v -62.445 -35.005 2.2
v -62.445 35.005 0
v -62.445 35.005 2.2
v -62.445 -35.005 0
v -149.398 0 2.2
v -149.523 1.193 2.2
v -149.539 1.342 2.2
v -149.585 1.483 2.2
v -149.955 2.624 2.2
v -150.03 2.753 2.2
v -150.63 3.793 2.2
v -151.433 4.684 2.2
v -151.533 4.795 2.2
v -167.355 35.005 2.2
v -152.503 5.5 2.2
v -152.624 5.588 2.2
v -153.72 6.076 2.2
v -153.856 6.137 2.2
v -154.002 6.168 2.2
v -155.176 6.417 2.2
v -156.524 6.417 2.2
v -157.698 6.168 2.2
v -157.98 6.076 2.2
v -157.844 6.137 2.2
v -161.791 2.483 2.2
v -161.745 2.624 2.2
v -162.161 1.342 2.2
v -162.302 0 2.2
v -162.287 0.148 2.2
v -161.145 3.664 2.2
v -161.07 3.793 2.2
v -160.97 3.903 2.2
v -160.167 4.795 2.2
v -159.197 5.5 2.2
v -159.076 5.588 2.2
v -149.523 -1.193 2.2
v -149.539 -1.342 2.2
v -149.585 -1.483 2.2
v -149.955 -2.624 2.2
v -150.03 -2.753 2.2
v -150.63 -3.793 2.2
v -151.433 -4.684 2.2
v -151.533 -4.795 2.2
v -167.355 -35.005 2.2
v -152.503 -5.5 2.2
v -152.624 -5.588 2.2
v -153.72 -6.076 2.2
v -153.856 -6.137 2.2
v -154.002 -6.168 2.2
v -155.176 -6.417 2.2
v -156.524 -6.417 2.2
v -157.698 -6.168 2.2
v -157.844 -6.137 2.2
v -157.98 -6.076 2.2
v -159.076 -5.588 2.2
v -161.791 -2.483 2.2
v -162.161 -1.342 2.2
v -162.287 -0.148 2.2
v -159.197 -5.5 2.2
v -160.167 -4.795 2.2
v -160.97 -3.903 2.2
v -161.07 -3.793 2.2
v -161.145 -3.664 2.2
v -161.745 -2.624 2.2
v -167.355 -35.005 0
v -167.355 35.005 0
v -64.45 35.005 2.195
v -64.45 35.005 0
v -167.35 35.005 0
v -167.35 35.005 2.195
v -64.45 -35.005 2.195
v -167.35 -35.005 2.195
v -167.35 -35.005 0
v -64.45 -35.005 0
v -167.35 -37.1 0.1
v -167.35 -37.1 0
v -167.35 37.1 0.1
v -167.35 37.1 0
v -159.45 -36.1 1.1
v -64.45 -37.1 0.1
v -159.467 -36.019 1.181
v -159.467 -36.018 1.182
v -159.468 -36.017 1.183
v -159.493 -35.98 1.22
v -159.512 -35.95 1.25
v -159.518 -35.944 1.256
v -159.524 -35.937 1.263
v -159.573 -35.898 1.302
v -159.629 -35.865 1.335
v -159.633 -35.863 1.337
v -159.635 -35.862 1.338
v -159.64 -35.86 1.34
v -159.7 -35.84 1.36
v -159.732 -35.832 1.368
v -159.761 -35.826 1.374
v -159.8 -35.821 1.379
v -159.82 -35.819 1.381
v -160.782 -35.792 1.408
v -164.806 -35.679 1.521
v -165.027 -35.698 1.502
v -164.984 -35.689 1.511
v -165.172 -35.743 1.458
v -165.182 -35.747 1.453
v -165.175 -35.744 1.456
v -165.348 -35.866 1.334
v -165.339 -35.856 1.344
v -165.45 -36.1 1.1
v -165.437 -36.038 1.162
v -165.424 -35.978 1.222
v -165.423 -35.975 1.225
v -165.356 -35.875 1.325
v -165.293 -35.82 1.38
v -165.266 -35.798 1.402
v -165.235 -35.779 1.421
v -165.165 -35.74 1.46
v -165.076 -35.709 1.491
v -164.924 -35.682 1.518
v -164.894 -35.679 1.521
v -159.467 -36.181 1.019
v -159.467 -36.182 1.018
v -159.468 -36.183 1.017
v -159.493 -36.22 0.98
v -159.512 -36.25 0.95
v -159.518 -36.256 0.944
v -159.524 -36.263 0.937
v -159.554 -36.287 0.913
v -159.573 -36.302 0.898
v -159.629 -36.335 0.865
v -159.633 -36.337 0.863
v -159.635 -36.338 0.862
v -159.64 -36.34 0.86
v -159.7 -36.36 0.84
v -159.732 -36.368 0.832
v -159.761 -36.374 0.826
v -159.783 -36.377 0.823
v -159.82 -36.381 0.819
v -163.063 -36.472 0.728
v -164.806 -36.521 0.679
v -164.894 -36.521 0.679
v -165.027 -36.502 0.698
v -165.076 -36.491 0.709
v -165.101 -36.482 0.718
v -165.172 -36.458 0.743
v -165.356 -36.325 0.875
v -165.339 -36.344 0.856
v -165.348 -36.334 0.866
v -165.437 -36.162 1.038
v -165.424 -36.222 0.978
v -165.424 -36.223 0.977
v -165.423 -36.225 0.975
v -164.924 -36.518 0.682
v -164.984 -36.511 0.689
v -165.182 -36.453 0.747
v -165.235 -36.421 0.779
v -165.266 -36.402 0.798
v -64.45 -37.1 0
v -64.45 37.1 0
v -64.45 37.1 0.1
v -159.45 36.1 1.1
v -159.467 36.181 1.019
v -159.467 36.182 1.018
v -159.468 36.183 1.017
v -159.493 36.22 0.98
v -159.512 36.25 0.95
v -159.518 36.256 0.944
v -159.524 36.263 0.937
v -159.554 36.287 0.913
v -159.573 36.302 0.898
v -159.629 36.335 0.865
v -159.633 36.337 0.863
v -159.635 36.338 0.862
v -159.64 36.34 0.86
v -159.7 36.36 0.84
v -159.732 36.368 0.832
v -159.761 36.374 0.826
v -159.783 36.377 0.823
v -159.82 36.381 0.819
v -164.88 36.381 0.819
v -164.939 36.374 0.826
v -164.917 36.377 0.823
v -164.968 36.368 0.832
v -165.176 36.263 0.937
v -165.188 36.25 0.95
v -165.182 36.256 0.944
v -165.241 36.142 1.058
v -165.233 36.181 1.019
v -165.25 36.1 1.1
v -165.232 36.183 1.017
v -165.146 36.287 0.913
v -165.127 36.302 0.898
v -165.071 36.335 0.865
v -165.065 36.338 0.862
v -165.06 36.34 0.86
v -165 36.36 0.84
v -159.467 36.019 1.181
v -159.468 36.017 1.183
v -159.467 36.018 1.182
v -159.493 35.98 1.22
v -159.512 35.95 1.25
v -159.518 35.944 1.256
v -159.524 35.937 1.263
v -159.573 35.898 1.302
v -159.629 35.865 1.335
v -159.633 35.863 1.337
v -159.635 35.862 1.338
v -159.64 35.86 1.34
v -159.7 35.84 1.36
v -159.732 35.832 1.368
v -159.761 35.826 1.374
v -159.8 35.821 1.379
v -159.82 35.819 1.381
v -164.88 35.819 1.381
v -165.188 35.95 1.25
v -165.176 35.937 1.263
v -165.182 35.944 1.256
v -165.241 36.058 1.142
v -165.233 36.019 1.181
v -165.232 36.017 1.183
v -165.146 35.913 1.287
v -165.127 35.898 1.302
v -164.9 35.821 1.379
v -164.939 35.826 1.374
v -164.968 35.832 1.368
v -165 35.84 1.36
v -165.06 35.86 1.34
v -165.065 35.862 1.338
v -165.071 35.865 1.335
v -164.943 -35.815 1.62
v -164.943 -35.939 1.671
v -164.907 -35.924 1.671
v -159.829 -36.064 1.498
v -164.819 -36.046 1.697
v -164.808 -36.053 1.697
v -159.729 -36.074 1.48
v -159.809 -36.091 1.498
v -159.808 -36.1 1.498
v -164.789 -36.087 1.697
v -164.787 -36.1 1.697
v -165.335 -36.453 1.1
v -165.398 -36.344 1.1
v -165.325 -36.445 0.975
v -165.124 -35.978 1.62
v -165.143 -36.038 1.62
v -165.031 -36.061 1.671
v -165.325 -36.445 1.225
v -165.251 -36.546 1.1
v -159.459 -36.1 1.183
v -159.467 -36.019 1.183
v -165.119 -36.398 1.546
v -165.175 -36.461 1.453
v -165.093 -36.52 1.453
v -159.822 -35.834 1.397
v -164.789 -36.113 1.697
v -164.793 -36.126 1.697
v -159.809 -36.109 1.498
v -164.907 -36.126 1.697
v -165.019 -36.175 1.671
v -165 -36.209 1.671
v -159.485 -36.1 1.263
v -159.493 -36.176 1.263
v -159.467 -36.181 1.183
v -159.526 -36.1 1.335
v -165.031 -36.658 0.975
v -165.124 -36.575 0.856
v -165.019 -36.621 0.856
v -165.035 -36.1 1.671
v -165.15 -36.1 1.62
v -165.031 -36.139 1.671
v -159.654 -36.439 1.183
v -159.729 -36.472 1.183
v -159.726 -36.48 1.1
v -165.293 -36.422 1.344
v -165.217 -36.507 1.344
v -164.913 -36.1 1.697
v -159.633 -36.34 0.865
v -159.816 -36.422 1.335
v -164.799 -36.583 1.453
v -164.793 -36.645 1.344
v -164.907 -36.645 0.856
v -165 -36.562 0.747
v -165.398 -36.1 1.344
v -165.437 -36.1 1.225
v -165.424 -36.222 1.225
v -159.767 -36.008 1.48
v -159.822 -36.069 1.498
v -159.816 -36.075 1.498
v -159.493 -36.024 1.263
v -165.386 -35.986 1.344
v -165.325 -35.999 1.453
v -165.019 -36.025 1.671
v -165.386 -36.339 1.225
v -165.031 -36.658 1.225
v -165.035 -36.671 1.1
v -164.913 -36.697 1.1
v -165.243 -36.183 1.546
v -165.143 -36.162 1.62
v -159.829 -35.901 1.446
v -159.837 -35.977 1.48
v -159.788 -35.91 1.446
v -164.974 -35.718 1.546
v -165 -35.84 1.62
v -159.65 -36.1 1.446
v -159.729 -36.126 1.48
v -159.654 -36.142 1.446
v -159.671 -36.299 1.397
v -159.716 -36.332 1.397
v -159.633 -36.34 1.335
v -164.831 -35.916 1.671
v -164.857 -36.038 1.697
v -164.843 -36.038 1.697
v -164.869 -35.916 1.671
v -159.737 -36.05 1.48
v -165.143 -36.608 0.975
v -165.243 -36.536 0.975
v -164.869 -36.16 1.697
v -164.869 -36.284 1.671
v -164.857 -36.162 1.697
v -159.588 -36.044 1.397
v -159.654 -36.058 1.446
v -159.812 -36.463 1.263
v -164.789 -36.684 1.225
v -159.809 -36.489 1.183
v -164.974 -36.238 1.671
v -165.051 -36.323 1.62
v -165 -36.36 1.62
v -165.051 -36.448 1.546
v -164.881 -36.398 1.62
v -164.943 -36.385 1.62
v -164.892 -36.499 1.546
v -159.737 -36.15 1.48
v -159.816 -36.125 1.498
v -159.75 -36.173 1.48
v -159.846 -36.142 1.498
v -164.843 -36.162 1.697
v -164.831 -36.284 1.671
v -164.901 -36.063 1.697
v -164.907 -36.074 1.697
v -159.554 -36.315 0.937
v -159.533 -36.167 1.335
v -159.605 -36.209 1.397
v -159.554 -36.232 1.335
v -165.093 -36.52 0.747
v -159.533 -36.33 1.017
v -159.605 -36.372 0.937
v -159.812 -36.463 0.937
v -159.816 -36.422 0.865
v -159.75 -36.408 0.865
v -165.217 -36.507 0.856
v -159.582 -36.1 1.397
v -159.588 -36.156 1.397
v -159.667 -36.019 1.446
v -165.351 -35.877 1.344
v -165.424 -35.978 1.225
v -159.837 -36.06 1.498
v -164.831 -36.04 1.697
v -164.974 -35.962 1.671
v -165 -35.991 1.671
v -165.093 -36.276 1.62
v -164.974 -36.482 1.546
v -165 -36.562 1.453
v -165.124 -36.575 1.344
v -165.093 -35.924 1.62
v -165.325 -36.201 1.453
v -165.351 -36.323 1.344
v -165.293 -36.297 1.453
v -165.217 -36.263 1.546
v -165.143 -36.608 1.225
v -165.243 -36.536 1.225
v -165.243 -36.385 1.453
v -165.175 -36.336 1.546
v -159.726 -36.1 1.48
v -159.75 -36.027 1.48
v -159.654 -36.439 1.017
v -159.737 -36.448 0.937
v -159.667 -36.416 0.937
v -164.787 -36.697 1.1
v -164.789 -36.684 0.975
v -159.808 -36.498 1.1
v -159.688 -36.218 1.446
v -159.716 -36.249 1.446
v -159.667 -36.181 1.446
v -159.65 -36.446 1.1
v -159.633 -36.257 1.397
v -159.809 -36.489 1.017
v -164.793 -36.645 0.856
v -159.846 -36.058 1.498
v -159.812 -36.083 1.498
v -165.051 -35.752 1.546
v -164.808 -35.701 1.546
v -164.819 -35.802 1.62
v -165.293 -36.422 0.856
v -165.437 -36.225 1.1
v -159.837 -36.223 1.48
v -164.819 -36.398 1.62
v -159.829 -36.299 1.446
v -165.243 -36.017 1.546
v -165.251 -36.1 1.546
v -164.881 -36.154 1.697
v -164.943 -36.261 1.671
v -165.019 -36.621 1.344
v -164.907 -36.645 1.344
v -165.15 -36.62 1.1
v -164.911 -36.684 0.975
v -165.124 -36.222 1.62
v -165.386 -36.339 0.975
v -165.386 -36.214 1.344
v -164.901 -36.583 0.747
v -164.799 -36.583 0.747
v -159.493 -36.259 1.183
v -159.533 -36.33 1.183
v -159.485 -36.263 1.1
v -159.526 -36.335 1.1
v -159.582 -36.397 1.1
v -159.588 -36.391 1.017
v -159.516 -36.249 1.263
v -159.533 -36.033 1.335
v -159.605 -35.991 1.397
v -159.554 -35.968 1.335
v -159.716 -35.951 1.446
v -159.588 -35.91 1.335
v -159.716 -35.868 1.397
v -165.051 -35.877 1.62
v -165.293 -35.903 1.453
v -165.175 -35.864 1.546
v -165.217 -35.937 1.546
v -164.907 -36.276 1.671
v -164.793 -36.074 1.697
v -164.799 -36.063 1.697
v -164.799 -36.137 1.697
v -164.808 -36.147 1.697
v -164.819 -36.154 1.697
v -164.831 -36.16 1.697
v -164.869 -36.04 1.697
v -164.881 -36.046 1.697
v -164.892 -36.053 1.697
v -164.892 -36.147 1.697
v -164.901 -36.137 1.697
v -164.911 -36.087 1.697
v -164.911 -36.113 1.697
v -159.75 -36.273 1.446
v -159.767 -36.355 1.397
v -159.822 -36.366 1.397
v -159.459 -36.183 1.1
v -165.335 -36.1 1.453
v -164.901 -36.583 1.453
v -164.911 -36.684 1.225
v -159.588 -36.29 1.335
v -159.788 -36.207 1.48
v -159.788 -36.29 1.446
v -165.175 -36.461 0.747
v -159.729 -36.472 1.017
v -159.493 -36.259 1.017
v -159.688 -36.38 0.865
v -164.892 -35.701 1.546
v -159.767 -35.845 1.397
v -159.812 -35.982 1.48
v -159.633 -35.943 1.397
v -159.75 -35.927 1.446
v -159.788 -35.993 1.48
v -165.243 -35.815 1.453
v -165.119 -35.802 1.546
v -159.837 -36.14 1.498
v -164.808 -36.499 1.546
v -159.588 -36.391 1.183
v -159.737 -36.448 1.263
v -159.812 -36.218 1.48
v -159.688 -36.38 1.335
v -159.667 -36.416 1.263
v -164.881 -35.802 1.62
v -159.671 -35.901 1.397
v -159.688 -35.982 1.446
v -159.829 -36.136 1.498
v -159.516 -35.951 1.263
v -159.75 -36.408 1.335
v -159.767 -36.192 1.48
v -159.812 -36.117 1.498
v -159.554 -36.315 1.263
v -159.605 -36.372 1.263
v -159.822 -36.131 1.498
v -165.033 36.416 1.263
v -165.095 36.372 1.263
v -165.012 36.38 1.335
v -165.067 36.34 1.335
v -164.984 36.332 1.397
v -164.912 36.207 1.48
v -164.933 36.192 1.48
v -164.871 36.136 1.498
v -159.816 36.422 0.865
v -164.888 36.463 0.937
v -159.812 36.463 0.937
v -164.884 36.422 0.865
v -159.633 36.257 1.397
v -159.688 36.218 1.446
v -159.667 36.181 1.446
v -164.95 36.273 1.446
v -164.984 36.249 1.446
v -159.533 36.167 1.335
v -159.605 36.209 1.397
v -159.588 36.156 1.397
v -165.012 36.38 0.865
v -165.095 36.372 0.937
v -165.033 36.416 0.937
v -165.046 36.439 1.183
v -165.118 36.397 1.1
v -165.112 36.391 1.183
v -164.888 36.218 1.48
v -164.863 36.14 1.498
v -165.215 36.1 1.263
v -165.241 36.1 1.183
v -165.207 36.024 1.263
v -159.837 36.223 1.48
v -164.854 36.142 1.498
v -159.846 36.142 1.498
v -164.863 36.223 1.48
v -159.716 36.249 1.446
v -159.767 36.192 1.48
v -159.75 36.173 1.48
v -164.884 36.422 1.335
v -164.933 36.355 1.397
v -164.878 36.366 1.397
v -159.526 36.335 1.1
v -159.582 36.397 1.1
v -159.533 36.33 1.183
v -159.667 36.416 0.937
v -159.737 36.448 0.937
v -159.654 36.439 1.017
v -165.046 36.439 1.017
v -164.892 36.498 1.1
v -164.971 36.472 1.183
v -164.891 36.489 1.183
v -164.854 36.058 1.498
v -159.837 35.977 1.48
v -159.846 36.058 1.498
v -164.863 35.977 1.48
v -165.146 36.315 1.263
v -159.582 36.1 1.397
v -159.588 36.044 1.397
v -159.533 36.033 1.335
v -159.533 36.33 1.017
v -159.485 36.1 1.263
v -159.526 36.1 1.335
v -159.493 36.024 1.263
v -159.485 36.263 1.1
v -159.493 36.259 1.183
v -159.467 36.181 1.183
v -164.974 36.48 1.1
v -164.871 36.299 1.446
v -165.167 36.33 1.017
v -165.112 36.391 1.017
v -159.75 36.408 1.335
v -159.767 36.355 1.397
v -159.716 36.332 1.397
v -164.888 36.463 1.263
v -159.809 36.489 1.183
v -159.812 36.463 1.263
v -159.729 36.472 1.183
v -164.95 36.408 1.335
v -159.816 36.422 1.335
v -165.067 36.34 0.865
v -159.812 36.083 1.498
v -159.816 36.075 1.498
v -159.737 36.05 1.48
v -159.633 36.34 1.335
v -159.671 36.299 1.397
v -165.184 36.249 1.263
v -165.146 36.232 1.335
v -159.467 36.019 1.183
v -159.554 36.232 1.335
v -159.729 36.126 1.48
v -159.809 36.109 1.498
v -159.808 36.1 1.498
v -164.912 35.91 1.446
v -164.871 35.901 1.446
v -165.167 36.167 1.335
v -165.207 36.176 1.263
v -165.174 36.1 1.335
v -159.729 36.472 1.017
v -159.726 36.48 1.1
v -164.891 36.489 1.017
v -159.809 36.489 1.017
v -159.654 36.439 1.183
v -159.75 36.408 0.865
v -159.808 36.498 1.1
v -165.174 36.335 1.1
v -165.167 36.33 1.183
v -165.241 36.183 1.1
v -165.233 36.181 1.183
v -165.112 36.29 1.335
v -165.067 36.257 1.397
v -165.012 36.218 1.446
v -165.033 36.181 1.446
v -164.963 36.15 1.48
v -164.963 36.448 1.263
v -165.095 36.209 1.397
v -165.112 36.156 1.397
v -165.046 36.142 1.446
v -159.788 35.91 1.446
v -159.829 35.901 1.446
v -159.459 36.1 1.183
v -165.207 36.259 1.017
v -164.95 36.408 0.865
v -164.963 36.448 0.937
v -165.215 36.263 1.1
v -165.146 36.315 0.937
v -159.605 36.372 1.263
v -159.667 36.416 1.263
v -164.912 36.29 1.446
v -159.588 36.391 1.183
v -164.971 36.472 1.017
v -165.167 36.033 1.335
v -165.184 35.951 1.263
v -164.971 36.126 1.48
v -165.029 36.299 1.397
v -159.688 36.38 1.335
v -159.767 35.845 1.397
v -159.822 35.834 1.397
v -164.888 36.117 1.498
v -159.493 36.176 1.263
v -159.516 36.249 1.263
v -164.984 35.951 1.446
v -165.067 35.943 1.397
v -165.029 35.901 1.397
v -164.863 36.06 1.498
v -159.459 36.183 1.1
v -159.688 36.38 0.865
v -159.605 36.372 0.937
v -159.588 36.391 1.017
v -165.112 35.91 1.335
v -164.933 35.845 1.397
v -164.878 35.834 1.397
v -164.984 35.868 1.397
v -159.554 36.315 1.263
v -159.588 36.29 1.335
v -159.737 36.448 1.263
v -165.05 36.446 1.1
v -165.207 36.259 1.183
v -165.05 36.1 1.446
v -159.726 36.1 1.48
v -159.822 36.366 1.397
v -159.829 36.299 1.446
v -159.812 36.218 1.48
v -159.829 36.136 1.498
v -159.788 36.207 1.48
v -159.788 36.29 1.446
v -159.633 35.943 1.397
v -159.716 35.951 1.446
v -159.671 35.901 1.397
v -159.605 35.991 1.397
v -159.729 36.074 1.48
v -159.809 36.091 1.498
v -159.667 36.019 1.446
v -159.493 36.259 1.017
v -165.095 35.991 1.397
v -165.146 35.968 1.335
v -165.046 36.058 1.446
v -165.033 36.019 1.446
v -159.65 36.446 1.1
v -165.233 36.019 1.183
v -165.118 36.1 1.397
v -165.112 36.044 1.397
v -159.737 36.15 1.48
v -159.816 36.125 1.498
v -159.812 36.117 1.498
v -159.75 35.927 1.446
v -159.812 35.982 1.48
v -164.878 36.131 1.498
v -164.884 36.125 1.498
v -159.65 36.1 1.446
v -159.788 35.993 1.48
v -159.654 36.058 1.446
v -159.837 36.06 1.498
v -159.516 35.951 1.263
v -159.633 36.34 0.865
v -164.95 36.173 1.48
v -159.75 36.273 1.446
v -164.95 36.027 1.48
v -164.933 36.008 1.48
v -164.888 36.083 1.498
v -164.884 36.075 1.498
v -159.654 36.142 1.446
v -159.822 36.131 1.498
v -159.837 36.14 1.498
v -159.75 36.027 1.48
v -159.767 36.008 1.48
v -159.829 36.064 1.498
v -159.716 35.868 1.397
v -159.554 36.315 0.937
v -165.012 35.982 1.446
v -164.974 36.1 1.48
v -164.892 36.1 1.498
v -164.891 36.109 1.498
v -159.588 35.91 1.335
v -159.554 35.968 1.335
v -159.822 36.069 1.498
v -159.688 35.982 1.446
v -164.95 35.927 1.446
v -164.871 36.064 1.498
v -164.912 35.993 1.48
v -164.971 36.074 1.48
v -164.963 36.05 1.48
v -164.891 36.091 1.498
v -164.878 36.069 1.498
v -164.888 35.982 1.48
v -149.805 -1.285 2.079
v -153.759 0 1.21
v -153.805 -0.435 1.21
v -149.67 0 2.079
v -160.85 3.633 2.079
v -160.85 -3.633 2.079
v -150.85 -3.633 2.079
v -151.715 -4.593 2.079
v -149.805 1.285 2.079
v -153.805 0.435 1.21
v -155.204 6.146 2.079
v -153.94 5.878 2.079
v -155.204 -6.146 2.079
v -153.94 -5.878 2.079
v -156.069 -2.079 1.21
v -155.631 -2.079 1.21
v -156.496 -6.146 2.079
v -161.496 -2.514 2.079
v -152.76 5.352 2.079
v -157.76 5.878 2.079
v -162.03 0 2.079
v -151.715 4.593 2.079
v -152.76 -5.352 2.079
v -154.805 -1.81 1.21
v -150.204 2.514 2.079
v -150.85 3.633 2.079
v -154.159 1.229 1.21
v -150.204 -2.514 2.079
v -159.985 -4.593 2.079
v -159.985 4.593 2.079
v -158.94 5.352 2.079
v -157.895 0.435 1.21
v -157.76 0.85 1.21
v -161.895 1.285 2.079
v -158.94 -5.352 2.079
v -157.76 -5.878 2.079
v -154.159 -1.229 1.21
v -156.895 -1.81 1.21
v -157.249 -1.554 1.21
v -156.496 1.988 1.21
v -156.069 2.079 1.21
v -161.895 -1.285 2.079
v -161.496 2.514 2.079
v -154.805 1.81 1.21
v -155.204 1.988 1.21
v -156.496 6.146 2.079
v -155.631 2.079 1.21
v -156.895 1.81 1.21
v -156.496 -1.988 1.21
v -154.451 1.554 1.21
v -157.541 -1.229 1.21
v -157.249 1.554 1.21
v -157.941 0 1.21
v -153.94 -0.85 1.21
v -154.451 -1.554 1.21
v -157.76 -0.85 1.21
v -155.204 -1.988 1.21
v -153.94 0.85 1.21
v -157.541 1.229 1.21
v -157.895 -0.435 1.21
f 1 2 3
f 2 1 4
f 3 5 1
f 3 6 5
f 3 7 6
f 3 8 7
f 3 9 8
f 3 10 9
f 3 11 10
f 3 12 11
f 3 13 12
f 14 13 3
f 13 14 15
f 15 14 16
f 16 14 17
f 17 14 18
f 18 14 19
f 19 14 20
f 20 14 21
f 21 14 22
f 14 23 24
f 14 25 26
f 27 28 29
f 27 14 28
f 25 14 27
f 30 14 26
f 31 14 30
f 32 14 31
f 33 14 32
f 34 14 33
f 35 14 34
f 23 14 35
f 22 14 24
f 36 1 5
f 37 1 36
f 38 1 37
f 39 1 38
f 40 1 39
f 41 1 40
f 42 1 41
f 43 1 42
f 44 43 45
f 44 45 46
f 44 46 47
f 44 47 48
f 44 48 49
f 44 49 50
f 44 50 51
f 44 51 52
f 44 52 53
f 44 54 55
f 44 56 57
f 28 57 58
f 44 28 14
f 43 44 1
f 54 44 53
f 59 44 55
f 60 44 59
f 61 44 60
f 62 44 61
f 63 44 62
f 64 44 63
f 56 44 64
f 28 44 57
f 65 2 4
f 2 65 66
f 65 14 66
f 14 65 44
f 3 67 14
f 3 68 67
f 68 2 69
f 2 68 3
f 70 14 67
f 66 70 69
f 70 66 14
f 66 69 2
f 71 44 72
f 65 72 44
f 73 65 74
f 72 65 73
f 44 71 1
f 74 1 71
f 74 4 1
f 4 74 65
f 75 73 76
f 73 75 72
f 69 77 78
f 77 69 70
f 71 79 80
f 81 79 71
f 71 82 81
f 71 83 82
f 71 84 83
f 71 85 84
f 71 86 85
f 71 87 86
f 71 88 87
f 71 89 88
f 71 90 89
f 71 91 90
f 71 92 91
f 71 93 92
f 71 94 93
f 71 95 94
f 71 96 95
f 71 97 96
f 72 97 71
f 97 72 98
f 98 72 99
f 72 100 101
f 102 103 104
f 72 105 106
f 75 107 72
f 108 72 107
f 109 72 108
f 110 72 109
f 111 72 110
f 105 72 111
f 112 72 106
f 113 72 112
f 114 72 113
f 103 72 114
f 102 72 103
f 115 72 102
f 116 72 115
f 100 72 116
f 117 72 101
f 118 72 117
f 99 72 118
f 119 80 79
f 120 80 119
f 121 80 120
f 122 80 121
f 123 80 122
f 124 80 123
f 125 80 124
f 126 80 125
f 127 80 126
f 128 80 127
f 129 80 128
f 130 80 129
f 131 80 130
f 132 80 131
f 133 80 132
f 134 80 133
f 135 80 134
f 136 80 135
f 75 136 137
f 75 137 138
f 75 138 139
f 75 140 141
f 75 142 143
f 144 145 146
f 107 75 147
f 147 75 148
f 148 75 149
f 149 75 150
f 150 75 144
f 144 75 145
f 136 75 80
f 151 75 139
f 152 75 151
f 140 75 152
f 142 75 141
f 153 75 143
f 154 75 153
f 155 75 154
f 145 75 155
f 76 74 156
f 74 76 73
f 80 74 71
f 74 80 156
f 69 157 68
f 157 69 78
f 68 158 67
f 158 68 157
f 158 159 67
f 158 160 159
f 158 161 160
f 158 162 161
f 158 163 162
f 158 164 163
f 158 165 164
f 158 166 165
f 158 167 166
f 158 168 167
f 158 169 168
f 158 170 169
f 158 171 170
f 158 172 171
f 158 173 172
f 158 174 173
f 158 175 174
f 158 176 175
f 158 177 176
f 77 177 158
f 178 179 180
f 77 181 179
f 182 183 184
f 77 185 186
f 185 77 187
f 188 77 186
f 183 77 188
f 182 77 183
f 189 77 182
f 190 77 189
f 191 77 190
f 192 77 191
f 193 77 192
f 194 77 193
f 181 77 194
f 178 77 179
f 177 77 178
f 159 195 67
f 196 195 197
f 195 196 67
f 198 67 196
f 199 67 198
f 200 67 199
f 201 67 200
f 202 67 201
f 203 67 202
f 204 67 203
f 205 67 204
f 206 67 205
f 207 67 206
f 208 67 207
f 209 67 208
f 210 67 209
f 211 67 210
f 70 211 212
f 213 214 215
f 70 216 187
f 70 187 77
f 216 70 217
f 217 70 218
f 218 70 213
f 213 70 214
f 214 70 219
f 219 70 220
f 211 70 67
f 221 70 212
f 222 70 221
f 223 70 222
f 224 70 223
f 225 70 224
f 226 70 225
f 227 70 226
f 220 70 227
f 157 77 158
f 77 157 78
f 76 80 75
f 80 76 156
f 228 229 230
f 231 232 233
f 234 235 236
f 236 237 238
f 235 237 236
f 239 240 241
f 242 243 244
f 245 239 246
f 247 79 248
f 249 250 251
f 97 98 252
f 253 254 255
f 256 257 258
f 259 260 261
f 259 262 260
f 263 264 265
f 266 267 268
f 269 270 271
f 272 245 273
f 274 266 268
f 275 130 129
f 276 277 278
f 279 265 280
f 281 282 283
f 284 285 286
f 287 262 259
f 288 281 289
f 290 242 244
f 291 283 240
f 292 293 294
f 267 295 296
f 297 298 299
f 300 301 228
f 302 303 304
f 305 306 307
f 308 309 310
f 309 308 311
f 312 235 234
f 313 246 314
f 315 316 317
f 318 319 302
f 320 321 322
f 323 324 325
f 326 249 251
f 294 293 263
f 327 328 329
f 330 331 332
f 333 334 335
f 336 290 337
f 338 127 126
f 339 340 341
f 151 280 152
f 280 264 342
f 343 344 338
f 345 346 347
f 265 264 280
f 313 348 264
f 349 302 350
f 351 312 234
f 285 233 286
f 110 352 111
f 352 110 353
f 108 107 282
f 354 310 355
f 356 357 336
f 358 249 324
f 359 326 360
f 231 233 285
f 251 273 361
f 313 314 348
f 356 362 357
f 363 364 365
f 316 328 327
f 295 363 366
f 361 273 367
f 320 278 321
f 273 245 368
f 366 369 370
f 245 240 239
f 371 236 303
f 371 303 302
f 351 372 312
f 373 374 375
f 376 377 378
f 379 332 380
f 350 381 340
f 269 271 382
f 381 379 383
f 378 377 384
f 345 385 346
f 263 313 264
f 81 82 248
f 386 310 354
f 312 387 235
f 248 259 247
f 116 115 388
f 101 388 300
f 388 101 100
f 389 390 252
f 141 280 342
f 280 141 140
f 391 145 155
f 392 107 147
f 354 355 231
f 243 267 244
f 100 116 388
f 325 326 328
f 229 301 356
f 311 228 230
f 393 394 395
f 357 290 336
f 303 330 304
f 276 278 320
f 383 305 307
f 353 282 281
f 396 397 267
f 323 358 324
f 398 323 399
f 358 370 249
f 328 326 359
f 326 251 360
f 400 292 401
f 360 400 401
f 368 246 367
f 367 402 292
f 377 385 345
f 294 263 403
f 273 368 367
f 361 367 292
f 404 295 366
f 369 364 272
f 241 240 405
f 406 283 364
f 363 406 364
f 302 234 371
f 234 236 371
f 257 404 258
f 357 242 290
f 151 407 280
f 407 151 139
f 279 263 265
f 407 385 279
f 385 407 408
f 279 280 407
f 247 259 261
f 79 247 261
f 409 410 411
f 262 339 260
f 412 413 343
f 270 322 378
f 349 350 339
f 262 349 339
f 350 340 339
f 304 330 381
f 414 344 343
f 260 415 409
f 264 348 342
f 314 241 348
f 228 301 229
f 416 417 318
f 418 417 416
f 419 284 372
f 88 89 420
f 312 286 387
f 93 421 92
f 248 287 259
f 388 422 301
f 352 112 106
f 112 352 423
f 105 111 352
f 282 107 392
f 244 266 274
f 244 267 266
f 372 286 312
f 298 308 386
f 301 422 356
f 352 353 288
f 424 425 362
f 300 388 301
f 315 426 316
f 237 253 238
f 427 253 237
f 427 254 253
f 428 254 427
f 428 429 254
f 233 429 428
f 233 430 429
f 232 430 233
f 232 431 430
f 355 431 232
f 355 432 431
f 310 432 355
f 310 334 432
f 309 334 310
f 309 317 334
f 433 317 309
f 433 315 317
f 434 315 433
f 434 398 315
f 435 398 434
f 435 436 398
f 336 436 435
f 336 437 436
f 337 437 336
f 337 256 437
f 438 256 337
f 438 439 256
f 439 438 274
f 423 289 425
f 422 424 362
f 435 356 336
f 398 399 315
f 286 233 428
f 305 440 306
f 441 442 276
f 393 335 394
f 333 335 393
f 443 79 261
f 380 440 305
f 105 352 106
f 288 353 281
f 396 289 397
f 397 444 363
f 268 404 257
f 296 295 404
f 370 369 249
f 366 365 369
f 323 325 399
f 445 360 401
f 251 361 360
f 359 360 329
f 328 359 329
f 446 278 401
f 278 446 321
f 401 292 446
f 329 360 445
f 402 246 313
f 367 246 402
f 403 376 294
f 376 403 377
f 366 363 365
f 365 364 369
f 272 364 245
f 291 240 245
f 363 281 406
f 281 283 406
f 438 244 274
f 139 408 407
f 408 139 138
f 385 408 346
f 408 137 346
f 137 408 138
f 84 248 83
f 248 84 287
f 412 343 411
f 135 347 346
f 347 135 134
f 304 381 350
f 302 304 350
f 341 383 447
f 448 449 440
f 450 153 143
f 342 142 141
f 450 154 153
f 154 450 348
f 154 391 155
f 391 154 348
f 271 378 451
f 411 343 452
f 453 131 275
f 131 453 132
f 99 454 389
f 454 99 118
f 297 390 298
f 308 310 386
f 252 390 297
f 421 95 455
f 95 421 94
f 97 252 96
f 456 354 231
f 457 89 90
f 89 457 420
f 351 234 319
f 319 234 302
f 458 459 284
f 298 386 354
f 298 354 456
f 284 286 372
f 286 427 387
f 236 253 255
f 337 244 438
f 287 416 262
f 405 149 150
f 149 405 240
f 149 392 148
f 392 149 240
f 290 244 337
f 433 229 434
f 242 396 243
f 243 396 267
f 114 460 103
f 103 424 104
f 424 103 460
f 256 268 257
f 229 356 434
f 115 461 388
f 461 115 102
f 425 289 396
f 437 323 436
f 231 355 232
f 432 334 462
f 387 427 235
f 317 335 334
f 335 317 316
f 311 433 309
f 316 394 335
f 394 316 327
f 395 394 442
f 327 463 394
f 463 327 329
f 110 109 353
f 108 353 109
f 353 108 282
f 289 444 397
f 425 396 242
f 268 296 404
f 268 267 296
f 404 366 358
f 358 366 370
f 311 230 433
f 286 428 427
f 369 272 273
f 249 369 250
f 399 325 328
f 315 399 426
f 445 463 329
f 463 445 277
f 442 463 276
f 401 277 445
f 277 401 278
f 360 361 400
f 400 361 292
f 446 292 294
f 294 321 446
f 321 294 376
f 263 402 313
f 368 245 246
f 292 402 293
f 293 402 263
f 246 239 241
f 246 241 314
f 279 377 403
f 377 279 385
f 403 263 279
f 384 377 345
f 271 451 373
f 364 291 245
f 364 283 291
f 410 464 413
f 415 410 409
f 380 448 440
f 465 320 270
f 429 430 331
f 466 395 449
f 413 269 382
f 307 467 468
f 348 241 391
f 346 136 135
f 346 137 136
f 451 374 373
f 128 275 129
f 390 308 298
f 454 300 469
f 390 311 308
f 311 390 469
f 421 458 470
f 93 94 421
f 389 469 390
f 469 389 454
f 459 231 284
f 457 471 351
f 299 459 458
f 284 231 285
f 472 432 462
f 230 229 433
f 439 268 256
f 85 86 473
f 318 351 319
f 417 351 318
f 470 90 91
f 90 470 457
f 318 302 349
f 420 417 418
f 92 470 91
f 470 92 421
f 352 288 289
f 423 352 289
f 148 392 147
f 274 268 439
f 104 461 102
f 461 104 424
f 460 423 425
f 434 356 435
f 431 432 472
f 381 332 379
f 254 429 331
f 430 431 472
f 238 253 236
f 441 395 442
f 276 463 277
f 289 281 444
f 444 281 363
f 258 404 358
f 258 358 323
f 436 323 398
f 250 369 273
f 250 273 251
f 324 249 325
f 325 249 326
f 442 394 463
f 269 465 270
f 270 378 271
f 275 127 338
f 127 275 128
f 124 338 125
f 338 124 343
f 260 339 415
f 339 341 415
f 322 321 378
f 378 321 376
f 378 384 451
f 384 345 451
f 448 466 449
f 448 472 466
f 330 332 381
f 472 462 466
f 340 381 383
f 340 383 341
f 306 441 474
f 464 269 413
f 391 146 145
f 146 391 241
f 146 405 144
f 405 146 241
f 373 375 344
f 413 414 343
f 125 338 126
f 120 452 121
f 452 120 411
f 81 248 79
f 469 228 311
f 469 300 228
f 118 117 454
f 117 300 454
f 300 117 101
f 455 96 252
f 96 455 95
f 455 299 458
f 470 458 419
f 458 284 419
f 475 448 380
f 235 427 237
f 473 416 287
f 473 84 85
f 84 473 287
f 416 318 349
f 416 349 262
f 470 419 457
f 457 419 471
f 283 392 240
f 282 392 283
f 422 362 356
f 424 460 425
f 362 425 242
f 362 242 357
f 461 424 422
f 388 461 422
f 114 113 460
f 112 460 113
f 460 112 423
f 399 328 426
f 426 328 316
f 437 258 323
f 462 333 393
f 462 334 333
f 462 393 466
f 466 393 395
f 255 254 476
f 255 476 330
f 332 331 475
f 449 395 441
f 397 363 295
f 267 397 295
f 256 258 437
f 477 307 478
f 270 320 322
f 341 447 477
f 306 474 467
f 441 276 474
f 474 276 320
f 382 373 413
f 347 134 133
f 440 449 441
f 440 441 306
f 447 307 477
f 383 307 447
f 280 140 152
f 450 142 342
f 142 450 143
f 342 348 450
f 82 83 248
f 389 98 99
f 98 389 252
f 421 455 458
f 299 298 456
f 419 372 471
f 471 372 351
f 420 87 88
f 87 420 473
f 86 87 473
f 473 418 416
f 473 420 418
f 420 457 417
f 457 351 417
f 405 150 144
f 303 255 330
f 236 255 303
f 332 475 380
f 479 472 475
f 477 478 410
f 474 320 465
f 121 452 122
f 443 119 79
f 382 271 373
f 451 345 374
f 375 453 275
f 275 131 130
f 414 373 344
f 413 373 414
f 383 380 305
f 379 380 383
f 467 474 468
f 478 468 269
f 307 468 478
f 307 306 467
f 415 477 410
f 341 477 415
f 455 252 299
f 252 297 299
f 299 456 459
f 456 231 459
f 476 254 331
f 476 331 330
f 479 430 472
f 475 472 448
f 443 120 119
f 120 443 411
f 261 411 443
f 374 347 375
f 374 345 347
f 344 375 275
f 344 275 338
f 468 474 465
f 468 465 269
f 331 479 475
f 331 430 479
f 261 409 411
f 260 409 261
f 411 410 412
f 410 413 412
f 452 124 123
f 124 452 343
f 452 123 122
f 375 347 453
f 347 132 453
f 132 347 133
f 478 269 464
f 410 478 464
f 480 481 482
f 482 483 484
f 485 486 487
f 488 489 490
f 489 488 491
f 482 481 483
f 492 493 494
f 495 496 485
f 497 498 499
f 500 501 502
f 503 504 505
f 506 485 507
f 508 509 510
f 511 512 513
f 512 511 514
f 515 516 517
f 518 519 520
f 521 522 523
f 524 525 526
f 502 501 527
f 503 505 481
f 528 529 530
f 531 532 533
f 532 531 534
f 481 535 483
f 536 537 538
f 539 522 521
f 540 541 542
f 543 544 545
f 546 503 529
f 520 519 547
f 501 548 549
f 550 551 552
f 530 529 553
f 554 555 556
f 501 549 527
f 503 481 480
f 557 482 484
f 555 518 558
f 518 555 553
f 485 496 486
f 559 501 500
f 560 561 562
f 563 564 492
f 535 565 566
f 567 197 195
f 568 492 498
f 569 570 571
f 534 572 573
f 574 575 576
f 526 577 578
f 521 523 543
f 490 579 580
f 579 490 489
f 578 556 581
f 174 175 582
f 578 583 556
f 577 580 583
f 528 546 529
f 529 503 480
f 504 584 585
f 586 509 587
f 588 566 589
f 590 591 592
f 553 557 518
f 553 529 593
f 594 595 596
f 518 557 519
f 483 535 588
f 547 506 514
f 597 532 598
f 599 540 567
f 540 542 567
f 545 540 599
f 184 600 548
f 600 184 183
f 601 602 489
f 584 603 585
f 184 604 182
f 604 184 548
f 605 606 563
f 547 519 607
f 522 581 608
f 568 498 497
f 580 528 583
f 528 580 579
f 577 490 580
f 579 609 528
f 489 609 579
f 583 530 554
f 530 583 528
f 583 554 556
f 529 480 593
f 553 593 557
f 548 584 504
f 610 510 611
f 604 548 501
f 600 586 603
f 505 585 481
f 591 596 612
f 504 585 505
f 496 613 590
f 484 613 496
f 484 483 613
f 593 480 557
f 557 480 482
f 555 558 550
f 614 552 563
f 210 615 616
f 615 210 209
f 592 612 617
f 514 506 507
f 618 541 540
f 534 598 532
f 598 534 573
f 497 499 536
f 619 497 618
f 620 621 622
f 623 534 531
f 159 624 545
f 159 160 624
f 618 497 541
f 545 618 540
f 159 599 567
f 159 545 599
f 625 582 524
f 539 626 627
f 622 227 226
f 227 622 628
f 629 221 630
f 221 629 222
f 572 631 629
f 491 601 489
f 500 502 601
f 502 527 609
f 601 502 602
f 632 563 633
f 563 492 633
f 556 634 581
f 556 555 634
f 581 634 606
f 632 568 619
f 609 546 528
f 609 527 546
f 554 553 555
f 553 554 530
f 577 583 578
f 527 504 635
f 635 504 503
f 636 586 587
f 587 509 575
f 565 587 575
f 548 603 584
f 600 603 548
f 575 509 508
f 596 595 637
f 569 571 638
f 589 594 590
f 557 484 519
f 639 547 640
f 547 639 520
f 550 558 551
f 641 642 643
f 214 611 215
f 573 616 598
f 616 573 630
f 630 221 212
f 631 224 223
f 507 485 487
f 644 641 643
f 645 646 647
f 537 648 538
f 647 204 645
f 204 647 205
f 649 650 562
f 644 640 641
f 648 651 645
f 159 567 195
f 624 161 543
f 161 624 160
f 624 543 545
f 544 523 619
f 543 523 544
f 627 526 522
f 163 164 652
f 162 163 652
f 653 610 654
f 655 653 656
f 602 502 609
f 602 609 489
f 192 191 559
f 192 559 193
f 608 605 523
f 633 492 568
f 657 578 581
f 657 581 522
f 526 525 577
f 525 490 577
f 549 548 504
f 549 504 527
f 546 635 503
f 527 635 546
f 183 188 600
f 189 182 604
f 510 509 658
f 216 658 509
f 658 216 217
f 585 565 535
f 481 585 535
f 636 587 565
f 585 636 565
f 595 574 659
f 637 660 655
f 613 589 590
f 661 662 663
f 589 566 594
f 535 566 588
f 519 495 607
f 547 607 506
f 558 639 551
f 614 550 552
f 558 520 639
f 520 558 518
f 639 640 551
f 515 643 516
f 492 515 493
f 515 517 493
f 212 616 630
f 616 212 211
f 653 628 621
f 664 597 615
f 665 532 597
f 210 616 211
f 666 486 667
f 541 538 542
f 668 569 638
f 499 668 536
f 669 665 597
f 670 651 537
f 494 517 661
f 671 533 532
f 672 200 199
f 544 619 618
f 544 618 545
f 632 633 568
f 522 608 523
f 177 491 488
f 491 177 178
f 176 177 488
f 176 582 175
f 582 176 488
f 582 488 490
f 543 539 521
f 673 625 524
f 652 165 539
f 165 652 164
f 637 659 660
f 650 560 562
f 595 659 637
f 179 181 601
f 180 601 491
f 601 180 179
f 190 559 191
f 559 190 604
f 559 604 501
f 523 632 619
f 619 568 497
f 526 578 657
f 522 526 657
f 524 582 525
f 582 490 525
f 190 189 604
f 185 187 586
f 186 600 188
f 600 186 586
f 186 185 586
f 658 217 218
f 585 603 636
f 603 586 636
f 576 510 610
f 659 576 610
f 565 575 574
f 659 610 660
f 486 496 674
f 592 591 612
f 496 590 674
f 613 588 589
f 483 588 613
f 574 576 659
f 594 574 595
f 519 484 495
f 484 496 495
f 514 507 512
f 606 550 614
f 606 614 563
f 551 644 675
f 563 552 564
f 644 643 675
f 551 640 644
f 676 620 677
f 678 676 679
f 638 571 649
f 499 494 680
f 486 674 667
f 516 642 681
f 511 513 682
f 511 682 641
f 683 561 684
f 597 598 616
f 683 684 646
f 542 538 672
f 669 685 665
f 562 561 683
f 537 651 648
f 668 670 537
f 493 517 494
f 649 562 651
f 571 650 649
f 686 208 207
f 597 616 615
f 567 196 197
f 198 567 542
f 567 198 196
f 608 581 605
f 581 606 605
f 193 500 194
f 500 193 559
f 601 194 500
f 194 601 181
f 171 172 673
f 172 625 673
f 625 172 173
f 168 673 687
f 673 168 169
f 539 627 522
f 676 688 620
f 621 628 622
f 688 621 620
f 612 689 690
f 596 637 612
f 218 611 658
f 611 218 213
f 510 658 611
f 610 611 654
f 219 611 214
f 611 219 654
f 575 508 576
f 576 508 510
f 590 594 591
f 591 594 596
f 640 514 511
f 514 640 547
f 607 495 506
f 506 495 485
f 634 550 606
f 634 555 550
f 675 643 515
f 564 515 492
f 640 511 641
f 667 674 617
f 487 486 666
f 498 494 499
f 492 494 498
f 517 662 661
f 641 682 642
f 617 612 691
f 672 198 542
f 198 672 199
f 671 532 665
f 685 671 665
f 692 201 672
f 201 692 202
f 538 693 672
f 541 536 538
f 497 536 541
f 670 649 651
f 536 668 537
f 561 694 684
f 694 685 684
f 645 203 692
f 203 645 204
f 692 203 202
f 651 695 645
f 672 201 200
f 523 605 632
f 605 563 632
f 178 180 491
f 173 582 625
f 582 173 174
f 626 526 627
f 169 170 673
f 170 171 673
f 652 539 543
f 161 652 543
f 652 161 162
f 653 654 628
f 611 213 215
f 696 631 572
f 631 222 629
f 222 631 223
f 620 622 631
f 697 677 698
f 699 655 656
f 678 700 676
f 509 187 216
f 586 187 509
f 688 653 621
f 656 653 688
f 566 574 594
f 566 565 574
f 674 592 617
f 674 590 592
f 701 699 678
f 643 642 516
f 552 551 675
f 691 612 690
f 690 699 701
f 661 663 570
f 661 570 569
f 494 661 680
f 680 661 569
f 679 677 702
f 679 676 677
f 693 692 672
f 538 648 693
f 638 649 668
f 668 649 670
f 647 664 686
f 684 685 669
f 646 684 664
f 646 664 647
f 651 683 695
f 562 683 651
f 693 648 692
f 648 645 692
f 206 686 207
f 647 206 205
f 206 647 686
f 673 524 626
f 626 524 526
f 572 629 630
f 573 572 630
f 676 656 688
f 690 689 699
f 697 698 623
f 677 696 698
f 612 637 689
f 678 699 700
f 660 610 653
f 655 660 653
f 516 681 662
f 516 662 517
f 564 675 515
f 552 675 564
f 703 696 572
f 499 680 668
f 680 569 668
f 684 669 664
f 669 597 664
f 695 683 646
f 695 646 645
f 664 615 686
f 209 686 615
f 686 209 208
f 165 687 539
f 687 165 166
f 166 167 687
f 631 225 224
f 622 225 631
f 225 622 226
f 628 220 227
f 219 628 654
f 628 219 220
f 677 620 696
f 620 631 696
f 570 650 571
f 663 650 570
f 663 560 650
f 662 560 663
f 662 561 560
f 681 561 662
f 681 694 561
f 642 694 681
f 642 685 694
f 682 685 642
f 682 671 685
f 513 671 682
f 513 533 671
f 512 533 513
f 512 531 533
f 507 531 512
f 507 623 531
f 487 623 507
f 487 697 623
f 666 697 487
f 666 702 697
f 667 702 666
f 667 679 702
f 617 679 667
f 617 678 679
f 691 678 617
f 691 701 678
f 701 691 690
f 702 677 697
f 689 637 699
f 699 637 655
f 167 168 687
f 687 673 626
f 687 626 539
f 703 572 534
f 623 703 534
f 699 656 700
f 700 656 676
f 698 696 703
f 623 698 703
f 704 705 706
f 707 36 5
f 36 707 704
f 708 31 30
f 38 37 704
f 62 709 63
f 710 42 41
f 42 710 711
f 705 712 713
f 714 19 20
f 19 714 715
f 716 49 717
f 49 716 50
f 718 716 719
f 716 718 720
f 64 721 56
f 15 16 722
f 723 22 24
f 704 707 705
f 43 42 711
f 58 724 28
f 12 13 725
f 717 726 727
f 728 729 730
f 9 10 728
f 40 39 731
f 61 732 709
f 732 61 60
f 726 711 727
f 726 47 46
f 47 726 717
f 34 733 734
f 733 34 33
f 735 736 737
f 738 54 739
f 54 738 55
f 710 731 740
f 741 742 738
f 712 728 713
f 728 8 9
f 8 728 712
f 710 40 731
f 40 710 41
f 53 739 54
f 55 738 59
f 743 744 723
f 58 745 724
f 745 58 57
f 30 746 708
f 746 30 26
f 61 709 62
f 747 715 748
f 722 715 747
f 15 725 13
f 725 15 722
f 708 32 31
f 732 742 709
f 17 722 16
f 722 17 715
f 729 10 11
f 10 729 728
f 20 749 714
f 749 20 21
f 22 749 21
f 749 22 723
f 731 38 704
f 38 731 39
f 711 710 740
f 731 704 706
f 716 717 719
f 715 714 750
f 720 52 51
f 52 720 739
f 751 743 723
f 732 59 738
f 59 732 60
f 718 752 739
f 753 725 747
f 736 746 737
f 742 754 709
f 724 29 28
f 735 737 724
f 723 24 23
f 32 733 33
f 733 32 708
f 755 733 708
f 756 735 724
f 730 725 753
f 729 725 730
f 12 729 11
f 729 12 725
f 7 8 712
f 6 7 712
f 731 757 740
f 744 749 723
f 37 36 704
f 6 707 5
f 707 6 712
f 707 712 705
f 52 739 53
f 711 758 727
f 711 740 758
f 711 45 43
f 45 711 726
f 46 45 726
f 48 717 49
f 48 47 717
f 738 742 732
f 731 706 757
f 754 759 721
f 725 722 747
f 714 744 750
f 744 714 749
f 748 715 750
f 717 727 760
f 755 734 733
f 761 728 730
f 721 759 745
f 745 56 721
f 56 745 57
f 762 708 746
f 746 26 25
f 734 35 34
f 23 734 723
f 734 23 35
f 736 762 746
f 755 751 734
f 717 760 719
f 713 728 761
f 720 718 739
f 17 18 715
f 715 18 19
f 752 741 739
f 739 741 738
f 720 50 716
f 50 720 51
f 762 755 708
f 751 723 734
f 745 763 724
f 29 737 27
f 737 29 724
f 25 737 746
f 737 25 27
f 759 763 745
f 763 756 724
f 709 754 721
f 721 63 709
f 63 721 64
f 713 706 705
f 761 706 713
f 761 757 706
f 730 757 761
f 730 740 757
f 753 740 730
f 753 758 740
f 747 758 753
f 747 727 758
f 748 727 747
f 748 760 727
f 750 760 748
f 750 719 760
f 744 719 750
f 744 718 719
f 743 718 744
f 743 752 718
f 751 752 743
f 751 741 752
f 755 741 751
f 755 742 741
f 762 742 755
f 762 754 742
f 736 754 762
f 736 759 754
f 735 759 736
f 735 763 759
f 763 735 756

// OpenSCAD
$fn = 30;

gWT = 1.4;
gTol = 0.3;

// rails
LidH = 2.2;
RailThick = 1.4;
RailWidth = LidH + RailThick;

SuitX = 101.5;
SuitY = 70;

FirstPX = 78.6;
FirstPY = 45.6;

BoardThick1 = 1.9;
BoardThick2 = 2.9;  // Board + leader cards


TotalX = SuitX + 2*gWT + 2*gTol;
TotalY = SuitY + 2*RailWidth + 2*gTol;
TotalZ = 20;

Objects = "Lid";

// Height not counting the lid
AdjBoxHeight = TotalZ - LidH;
gPattern = "Dominance";  //  Salvation, Dominance, Harmony, Progress, Unity

module RCube(x,y,z,ipR=4) {
    translate([-x/2,-y/2,0]) hull(){
      translate([ipR,ipR,ipR]) sphere(ipR);
      translate([x-ipR,ipR,ipR]) sphere(ipR);
      translate([ipR,y-ipR,ipR]) sphere(ipR);
      translate([x-ipR,y-ipR,ipR]) sphere(ipR);
      translate([ipR,ipR,z-ipR]) sphere(ipR);
      translate([x-ipR,ipR,z-ipR]) sphere(ipR);
      translate([ipR,y-ipR,z-ipR]) sphere(ipR);
      translate([x-ipR,y-ipR,z-ipR]) sphere(ipR);
      }  
} 

module lid(ipPattern = "Hex", ipTol = 0.3){
  lAdjX = TotalX;
  lAdjY = TotalY-RailWidth*2-ipTol*2;  
  lAdjZ = LidH;
  CutX = lAdjX - 8;
  CutY = lAdjY - 8;
  lFingerX = 15;
  lFingerY = 16;  

  // main square with center removed for a pattern. 0.01 addition is a kludge to avoid a 2d surface remainging when substracting the lid from the box.
  difference() {
      translate([0,0,lAdjZ/2]) cube([lAdjX+0.01, lAdjY+0.01 , lAdjZ], center=true);
      translate([0,0,lAdjZ/2]) cube([CutX, CutY, lAdjZ], center = true);      
  }
  
  // The Side triangles
  intersection () {
      union () {
          translate([-lAdjX/2,-lAdjY/2-LidH,LidH]) rotate([0,90,0]) linear_extrude(TotalX-2) polygon([[LidH,0],[LidH,LidH],[0,LidH]], paths=[[0,1,2]]);
          translate([-lAdjX/2,lAdjY/2,LidH]) rotate([0,90,0]) linear_extrude(TotalX-2) polygon([[0,0],[LidH,0],[LidH,LidH]], paths=[[0,1,2]]);
      }
      if (ipTol>0) 
         {cube([lAdjX, lAdjY + 2*LidH-0.2, lAdjZ*2], center=true);}
  }

  // create the nubs
  if (ipTol > 0) 
  {
  translate([5-lAdjX/2,-lAdjY/2-LidH/2,lAdjZ/2])  hull() {translate([2.5,0,0])sphere(0.4); translate([-2.5,0,0]) sphere(0.6);}
  translate([5-lAdjX/2,lAdjY/2+LidH/2,lAdjZ/2]) hull() {translate([2.5,0,0])sphere(0.4); translate([-2.5,0,0]) sphere(0.4);}
  }
  else
  {
  translate([5-lAdjX/2,-lAdjY/2-LidH/2,lAdjZ/2])  hull() {translate([2.5,0,0])sphere(0.6); translate([-2.5,0,0]) sphere(0.8);}
  translate([5-lAdjX/2,lAdjY/2+LidH/2,lAdjZ/2]) hull() {translate([2.5,0,0])sphere(0.6); translate([-2.5,0,0]) sphere(0.8);}
  }

  // Finger slot
  difference () {
      translate([-CutX/2,-lFingerY/2,0]) cube([lFingerX, lFingerY, lAdjZ]); 
      translate([-CutX/2+lFingerX/2,0,20+LidH/2])sphere(20);     
  }

  // Solid top 
   difference ()
   { 
        translate([0,0,lAdjZ/2]) cube([CutX,CutY,lAdjZ], center=true);
        translate([-CutX/2,-lFingerY/2,0]) cube([lFingerX, lFingerY, lAdjZ]);
        if (ipPattern == "Harmony")
           translate([-TotalX/4-13,TotalY/2-6,lAdjZ-1])linear_extrude(2) rotate([0,0,-90]) scale([0.11,0.11]) import("Harmony.dxf");
        if (ipPattern == "Dominance")
           translate([-TotalX/4-3,TotalY/2-3,lAdjZ-1])linear_extrude(2) rotate([0,0,-90]) scale([0.1,0.1]) import("Dominance.dxf");
        if (ipPattern == "Salvation")
           translate([-TotalX/4-5,TotalY/2-10,lAdjZ-1])linear_extrude(2) rotate([0,0,-90]) scale([0.1,0.1]) import("Salvation.dxf");
        if (ipPattern == "Progress")
           translate([-TotalX/4-5,TotalY/2-13,lAdjZ-1])linear_extrude(2) rotate([0,0,-90]) scale([0.1,0.1]) import("Progress.dxf");
        if (ipPattern == "Unity")
           translate([-TotalX/4-10,TotalY/2-2,lAdjZ-1])linear_extrude(2) rotate([0,0,-90]) scale([0.13,0.13]) import("Unity.dxf");
        
   }
    
}


module box () 
{
    
echo (TotalX, TotalY, TotalZ, AdjBoxHeight, RailWidth, LidH);    
  //  Main Box
  difference() 
  {    
    translate ([0,0,AdjBoxHeight/2]) cube([TotalX,TotalY,AdjBoxHeight], center = true);

    // Scope out compartment areas
      
    // Slot for the Suit tile + Leader Call(use an extra gTOl for leader thickness
    translate([0,0,AdjBoxHeight-(BoardThick2+gTol)/2]) cube([SuitX+2*gTol,SuitY+2*gTol,BoardThick2 + gTol],center=true);         
      
    // Slot for First player marker  
    translate([0,0,AdjBoxHeight-(BoardThick1+gTol)/2-BoardThick2-gTol]) cube([FirstPX+2*gTol,FirstPY+2*gTol,BoardThick1 + gTol ],center=true);        
    StoreX = (SuitX - 6 - gWT) / 2;  
    StoreY = (SuitY - 6 - gWT) / 2;
      
    // 4 compartments  move one wall over 5 mm  
    translate([(StoreX+gWT)/2,(StoreY+gWT)/2,gWT]) RCube(StoreX,StoreY,TotalZ); 
    translate([-(StoreX+gWT)/2,(StoreY+gWT)/2,gWT]) RCube(StoreX,StoreY,TotalZ); 
    translate([(StoreX+gWT)/2-2.5,-(StoreY+gWT)/2,gWT]) RCube(StoreX+5,StoreY,TotalZ); 
    translate([-(StoreX+gWT)/2-2.5,-(StoreY+gWT)/2,gWT]) RCube(StoreX-5,StoreY,TotalZ); 
      
    translate([-TotalX/2,0,AdjBoxHeight-7])scale([1,1,1])cylinder(r=5,h=7);  
      
    //////////////////////  
  }

  // top rails
  difference() {
      union() {
          translate([0,-TotalY/2+RailWidth/2,AdjBoxHeight+LidH/2]) cube([TotalX,RailWidth,LidH],center = true);  
          translate([0,TotalY/2-RailWidth/2,AdjBoxHeight+LidH/2]) cube([TotalX,RailWidth,LidH],center = true);
           }
       
      // Trim each rail top to a 45 degree angle     
      translate([0,-TotalY/2,AdjBoxHeight+RailWidth]) rotate([45,0,0]) cube([TotalX,RailWidth+0.7,RailWidth+0.7], center=true); 
      translate([0,TotalY/2,AdjBoxHeight+RailWidth])  rotate([45,0,0]) cube([TotalX,RailWidth+0.7,RailWidth+0.7], center=true);  

      // Substract the lid from the rails
      translate([0,0,AdjBoxHeight]) lid(ipPattern = "Solid",ipTol =0);
      
   } // end diff for rails     
}


// Production Box
if ((Objects == "Both") || (Objects == "Box")){
  intersection() {
     box();
     RCube(TotalX,TotalY,TotalZ,1);
  }
}

// Production Lid
if ((Objects == "Both")  || (Objects == "Lid")){
  translate([-TotalX - 10,0,0]) lid(ipPattern = gPattern, ipTol = gTol);
}
